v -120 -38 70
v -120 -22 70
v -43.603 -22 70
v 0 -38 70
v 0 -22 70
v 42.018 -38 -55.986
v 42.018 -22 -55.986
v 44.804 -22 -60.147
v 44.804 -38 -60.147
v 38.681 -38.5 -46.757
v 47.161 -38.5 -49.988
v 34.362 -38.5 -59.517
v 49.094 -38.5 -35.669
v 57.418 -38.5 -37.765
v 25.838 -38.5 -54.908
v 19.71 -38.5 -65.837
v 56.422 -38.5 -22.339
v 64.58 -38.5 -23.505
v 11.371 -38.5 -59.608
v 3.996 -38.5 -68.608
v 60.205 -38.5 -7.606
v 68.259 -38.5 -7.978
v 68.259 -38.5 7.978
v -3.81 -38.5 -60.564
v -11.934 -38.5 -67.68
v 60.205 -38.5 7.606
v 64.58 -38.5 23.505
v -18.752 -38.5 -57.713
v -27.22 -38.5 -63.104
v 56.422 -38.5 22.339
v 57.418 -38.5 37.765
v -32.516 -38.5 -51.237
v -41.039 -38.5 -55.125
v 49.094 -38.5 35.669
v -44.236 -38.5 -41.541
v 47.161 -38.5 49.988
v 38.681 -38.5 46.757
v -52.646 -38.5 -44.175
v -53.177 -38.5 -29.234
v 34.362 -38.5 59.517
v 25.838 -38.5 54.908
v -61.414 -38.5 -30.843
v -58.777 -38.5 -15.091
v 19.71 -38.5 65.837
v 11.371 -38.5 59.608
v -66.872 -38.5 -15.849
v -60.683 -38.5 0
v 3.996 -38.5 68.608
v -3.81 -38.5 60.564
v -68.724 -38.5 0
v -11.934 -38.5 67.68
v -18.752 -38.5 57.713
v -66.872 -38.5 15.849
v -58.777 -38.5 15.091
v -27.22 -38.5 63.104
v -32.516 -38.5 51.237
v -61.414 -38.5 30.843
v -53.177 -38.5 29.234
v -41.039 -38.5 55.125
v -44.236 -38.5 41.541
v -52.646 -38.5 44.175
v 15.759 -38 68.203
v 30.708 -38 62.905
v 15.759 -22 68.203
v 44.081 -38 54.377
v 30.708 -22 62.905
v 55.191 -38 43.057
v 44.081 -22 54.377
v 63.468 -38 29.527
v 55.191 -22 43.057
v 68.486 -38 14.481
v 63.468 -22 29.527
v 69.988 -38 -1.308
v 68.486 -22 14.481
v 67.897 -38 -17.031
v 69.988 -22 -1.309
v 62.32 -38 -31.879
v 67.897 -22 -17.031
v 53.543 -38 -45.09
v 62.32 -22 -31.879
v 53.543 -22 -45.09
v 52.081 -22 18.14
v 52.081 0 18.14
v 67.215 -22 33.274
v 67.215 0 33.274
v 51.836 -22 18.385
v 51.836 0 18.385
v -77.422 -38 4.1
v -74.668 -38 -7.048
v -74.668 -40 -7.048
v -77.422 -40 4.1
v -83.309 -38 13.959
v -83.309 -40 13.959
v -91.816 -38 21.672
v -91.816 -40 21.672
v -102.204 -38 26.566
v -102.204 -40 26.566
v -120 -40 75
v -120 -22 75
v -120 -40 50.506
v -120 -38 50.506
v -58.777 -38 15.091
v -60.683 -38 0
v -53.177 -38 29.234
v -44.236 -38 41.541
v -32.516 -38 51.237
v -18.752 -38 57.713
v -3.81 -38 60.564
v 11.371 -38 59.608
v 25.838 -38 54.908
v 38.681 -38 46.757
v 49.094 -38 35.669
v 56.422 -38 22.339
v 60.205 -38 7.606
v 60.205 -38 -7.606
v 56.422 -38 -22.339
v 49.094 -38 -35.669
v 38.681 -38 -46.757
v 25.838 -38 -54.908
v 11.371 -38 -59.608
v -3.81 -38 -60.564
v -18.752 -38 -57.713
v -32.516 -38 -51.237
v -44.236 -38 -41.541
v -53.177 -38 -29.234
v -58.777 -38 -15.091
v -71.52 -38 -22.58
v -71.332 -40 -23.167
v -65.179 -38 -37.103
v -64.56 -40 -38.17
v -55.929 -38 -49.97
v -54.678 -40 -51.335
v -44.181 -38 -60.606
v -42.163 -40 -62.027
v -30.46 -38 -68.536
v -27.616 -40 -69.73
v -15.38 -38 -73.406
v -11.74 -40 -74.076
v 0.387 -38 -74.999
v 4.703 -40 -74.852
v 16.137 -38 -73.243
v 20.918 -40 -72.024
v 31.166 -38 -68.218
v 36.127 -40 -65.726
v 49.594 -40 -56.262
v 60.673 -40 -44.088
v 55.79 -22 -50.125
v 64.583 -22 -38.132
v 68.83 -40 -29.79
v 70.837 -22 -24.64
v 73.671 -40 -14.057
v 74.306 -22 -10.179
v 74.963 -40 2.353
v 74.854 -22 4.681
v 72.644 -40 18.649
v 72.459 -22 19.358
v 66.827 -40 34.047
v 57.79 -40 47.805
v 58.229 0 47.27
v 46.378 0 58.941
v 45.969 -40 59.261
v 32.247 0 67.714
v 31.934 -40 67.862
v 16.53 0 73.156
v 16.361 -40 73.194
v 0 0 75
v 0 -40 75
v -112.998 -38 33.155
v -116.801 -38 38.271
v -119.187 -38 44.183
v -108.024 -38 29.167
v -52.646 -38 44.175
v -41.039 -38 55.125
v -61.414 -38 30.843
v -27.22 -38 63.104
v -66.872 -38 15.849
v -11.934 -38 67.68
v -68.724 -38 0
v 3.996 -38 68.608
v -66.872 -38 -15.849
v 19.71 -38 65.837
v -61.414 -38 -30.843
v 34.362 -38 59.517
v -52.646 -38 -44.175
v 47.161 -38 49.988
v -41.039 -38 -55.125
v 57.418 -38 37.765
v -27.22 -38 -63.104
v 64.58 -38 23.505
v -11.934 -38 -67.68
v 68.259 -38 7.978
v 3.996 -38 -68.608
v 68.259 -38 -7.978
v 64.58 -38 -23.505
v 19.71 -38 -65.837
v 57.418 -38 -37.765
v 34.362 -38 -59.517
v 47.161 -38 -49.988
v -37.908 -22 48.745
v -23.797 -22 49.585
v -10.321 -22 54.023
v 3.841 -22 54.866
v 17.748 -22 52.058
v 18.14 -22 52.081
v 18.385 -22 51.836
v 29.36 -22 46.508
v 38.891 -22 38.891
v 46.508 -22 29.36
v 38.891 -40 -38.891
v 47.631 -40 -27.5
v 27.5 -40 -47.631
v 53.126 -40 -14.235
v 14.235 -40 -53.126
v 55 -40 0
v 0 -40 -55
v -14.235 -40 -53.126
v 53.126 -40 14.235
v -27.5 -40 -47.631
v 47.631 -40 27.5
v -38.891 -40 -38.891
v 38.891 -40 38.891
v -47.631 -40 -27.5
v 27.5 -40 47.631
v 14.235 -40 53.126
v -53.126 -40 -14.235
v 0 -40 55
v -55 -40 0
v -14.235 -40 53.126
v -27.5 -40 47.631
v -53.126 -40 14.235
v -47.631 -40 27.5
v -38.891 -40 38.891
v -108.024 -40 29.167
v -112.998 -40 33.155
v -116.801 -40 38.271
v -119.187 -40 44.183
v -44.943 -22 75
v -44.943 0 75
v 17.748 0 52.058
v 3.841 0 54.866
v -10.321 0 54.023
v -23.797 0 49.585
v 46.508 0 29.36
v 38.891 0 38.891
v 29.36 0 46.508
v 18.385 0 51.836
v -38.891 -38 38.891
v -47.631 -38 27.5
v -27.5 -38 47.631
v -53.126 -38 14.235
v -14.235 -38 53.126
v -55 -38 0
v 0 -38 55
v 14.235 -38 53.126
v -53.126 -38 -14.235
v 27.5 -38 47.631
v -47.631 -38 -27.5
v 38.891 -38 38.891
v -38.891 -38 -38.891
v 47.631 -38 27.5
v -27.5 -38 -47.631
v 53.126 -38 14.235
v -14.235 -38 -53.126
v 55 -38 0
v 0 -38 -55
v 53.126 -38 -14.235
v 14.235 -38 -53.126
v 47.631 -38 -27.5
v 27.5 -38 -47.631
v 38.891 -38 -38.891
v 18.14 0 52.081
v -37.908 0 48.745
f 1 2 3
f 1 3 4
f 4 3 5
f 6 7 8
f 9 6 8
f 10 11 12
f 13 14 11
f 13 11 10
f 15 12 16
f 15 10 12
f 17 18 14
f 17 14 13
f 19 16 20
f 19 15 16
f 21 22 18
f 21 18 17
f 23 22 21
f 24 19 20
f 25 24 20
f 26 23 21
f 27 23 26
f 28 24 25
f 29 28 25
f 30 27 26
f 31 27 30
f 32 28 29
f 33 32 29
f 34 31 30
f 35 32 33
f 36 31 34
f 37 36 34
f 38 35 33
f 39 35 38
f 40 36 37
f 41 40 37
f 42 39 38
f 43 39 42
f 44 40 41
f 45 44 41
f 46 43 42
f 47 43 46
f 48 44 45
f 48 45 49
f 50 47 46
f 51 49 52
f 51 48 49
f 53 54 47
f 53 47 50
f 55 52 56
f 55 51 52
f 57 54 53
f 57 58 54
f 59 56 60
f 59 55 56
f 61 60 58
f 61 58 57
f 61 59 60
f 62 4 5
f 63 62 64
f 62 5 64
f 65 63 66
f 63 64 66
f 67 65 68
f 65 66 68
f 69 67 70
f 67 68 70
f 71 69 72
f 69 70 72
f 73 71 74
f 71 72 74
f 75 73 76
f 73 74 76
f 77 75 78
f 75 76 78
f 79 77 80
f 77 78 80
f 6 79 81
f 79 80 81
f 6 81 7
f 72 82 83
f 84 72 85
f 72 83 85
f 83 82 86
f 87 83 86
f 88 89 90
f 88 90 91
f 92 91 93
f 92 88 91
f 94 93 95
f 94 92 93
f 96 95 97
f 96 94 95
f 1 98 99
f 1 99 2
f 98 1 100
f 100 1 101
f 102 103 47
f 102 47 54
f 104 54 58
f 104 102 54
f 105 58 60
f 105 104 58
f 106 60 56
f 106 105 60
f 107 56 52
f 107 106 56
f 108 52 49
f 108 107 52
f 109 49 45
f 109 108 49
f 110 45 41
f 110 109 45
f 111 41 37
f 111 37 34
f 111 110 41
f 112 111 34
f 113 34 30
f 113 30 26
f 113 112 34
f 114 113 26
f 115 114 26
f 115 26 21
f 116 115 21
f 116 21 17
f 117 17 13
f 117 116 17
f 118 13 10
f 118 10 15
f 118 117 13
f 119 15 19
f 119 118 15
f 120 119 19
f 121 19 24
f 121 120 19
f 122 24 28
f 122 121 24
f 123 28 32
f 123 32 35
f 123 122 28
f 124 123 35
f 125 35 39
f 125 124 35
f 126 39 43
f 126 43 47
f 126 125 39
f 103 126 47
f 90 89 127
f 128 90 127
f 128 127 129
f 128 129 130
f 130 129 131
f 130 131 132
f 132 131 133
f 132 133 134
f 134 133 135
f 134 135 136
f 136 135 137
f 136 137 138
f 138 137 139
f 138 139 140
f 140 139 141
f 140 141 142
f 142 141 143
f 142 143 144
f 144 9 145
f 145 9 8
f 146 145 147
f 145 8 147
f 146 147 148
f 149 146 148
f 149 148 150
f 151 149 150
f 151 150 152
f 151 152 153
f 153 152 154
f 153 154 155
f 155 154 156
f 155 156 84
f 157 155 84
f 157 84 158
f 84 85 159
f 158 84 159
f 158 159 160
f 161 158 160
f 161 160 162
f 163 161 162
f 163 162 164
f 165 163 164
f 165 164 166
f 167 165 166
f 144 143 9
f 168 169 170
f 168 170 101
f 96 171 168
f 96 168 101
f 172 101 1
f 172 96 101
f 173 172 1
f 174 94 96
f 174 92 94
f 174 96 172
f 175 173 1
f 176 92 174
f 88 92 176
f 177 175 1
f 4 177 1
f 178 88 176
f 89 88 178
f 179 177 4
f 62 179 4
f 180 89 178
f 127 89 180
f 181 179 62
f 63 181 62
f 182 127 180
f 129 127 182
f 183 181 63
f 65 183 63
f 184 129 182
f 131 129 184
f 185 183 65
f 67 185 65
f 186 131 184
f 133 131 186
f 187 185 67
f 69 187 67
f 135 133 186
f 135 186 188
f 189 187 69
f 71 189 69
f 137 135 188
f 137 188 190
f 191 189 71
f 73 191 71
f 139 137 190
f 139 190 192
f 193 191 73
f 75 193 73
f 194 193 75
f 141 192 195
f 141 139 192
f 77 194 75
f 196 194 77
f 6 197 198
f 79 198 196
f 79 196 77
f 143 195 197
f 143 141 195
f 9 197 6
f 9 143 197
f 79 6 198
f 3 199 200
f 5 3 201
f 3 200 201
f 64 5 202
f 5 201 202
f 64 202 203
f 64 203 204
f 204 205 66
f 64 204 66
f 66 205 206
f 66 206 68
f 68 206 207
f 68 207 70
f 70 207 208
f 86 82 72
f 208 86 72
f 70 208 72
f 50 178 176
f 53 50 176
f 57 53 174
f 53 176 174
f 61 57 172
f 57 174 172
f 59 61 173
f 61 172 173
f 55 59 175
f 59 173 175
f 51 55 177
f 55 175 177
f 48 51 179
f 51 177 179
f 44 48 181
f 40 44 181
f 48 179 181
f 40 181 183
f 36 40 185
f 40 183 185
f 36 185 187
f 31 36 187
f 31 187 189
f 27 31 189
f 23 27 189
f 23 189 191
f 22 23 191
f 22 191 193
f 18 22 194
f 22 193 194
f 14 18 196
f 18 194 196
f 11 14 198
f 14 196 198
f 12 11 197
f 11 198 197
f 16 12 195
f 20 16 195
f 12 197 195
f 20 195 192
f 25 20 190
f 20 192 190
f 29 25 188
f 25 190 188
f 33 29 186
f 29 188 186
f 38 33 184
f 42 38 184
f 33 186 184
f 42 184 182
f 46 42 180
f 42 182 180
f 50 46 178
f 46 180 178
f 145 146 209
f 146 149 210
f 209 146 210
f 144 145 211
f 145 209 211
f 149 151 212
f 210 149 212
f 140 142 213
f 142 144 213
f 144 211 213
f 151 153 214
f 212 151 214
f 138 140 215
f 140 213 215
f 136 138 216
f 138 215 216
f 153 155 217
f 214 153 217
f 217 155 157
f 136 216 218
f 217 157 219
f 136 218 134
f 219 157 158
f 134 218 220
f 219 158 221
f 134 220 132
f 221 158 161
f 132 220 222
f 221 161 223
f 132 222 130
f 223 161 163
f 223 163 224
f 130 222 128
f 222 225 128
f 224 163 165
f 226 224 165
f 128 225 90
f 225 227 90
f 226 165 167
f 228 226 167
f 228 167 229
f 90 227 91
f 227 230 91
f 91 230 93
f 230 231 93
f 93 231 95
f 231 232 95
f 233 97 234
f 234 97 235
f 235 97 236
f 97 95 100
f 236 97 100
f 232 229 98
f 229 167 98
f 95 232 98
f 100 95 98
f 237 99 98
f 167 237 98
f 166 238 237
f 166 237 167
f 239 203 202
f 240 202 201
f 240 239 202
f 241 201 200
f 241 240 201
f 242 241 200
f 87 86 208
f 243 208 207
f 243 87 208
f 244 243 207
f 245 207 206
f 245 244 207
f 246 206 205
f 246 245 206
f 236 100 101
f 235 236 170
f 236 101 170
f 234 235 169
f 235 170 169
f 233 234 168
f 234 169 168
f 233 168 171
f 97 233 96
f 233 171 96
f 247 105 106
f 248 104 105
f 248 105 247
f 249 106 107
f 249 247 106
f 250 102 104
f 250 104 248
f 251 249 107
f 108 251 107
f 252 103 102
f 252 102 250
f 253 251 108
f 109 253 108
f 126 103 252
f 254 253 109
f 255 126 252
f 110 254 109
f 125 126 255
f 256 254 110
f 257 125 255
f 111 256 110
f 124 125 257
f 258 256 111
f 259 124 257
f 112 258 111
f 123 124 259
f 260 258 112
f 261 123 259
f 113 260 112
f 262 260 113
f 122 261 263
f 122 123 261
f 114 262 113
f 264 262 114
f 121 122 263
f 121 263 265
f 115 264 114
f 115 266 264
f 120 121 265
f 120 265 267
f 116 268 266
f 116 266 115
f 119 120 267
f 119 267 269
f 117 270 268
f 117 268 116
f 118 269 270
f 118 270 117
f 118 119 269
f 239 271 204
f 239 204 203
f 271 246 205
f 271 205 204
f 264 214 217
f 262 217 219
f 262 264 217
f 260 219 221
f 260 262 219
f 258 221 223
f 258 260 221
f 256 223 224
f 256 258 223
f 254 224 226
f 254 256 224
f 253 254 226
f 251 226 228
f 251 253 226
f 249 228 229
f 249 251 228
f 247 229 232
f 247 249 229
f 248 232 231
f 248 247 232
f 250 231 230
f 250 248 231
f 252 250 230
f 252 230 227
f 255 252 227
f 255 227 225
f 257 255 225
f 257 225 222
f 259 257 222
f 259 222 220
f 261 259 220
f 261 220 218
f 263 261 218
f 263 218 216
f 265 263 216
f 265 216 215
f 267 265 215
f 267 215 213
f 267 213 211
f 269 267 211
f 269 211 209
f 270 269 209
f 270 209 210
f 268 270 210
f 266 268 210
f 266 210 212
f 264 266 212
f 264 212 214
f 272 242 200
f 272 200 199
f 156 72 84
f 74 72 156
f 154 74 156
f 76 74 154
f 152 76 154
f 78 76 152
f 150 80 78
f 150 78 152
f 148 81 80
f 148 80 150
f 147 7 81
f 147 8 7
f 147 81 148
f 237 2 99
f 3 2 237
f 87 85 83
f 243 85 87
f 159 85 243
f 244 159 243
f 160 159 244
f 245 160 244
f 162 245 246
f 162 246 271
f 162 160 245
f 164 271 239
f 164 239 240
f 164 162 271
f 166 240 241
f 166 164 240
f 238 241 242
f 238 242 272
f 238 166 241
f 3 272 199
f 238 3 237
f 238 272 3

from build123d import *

# Parameters (mm, degrees)
SKETCH_R        = 55
PAD_DEPTH       = 40
POCKET_DEPTH    = 22
POCKET001_DEPTH = 16
SKETCH004_R     = 68.724133
SKETCH004_R_2   = 60.683335
POCKET002_DEPTH = 0.5


with BuildPart() as part:
    # Sketch → Pad (new body)
    with BuildSketch(Plane.XZ):
        with BuildLine():
            Line((-120, 75), (0, 75))
            ThreePointArc((-74.66808, -7.048245), (55.468993, -50.479608), (0, 75))
            ThreePointArc((-74.66808, -7.048245), (-83.30852, 13.959176), (-102.203647, 26.566441))
            ThreePointArc((-120, 50.506104), (-115.063539, 35.591198), (-102.203647, 26.566441))
            Line((-120, 75), (-120, 50.506104))
        make_face()
        Circle(SKETCH_R, mode=Mode.SUBTRACT)
    extrude(amount=PAD_DEPTH)

    # Sketch001 (on Face7 of Pad) → Pocket (cut)
    with BuildSketch(Plane(origin=(0, 0, 0), x_dir=(1, 0, 0), z_dir=(0, 1, 0))):
        with BuildLine():
            Line((52.081201, -18.140076), (85.552432, -51.611306))
            ThreePointArc((85.552432, -51.611306), (26.786197, 96.257182), (-99.914691, 0))
            Line((-211.758942, -108.831918), (-99.914691, 0))
            Line((-54.008053, -108.831918), (-211.758942, -108.831918))
            Line((-37.907945, -48.745498), (-54.008053, -108.831918))
            Line((18.140076, -52.081201), (-37.907945, -48.745498))
            Line((52.081201, -18.140076), (18.140076, -52.081201))
        make_face()
    extrude(amount=-POCKET_DEPTH, mode=Mode.SUBTRACT)

    # Sketch003 (on Face2 of Pocket) → Pocket001 (cut)
    with BuildSketch(Plane(origin=(0, -22, 0), x_dir=(1, 0, 0), z_dir=(0, 1, 0))):
        with BuildLine():
            ThreePointArc((0, -70), (66.404243, -22.146705), (42.018147, 55.986385))
            Line((42.018147, 55.986385), (62.226624, 86.16832))
            Line((62.226624, 86.16832), (-170.809082, 86.16832))
            Line((-170.809082, 86.16832), (-170.809082, -70))
            Line((-170.809082, -70), (0, -70))
        make_face()
    extrude(amount=-POCKET001_DEPTH, mode=Mode.SUBTRACT)

    # Sketch004 → Pocket002 (cut)
    with BuildSketch(Plane(origin=(0, -38, 0), x_dir=(-1, 0, 0), z_dir=(0, 1, 0))):
        Circle(SKETCH004_R)
        Circle(SKETCH004_R_2, mode=Mode.SUBTRACT)
    extrude(amount=-POCKET002_DEPTH, mode=Mode.SUBTRACT)


solid = part.part
